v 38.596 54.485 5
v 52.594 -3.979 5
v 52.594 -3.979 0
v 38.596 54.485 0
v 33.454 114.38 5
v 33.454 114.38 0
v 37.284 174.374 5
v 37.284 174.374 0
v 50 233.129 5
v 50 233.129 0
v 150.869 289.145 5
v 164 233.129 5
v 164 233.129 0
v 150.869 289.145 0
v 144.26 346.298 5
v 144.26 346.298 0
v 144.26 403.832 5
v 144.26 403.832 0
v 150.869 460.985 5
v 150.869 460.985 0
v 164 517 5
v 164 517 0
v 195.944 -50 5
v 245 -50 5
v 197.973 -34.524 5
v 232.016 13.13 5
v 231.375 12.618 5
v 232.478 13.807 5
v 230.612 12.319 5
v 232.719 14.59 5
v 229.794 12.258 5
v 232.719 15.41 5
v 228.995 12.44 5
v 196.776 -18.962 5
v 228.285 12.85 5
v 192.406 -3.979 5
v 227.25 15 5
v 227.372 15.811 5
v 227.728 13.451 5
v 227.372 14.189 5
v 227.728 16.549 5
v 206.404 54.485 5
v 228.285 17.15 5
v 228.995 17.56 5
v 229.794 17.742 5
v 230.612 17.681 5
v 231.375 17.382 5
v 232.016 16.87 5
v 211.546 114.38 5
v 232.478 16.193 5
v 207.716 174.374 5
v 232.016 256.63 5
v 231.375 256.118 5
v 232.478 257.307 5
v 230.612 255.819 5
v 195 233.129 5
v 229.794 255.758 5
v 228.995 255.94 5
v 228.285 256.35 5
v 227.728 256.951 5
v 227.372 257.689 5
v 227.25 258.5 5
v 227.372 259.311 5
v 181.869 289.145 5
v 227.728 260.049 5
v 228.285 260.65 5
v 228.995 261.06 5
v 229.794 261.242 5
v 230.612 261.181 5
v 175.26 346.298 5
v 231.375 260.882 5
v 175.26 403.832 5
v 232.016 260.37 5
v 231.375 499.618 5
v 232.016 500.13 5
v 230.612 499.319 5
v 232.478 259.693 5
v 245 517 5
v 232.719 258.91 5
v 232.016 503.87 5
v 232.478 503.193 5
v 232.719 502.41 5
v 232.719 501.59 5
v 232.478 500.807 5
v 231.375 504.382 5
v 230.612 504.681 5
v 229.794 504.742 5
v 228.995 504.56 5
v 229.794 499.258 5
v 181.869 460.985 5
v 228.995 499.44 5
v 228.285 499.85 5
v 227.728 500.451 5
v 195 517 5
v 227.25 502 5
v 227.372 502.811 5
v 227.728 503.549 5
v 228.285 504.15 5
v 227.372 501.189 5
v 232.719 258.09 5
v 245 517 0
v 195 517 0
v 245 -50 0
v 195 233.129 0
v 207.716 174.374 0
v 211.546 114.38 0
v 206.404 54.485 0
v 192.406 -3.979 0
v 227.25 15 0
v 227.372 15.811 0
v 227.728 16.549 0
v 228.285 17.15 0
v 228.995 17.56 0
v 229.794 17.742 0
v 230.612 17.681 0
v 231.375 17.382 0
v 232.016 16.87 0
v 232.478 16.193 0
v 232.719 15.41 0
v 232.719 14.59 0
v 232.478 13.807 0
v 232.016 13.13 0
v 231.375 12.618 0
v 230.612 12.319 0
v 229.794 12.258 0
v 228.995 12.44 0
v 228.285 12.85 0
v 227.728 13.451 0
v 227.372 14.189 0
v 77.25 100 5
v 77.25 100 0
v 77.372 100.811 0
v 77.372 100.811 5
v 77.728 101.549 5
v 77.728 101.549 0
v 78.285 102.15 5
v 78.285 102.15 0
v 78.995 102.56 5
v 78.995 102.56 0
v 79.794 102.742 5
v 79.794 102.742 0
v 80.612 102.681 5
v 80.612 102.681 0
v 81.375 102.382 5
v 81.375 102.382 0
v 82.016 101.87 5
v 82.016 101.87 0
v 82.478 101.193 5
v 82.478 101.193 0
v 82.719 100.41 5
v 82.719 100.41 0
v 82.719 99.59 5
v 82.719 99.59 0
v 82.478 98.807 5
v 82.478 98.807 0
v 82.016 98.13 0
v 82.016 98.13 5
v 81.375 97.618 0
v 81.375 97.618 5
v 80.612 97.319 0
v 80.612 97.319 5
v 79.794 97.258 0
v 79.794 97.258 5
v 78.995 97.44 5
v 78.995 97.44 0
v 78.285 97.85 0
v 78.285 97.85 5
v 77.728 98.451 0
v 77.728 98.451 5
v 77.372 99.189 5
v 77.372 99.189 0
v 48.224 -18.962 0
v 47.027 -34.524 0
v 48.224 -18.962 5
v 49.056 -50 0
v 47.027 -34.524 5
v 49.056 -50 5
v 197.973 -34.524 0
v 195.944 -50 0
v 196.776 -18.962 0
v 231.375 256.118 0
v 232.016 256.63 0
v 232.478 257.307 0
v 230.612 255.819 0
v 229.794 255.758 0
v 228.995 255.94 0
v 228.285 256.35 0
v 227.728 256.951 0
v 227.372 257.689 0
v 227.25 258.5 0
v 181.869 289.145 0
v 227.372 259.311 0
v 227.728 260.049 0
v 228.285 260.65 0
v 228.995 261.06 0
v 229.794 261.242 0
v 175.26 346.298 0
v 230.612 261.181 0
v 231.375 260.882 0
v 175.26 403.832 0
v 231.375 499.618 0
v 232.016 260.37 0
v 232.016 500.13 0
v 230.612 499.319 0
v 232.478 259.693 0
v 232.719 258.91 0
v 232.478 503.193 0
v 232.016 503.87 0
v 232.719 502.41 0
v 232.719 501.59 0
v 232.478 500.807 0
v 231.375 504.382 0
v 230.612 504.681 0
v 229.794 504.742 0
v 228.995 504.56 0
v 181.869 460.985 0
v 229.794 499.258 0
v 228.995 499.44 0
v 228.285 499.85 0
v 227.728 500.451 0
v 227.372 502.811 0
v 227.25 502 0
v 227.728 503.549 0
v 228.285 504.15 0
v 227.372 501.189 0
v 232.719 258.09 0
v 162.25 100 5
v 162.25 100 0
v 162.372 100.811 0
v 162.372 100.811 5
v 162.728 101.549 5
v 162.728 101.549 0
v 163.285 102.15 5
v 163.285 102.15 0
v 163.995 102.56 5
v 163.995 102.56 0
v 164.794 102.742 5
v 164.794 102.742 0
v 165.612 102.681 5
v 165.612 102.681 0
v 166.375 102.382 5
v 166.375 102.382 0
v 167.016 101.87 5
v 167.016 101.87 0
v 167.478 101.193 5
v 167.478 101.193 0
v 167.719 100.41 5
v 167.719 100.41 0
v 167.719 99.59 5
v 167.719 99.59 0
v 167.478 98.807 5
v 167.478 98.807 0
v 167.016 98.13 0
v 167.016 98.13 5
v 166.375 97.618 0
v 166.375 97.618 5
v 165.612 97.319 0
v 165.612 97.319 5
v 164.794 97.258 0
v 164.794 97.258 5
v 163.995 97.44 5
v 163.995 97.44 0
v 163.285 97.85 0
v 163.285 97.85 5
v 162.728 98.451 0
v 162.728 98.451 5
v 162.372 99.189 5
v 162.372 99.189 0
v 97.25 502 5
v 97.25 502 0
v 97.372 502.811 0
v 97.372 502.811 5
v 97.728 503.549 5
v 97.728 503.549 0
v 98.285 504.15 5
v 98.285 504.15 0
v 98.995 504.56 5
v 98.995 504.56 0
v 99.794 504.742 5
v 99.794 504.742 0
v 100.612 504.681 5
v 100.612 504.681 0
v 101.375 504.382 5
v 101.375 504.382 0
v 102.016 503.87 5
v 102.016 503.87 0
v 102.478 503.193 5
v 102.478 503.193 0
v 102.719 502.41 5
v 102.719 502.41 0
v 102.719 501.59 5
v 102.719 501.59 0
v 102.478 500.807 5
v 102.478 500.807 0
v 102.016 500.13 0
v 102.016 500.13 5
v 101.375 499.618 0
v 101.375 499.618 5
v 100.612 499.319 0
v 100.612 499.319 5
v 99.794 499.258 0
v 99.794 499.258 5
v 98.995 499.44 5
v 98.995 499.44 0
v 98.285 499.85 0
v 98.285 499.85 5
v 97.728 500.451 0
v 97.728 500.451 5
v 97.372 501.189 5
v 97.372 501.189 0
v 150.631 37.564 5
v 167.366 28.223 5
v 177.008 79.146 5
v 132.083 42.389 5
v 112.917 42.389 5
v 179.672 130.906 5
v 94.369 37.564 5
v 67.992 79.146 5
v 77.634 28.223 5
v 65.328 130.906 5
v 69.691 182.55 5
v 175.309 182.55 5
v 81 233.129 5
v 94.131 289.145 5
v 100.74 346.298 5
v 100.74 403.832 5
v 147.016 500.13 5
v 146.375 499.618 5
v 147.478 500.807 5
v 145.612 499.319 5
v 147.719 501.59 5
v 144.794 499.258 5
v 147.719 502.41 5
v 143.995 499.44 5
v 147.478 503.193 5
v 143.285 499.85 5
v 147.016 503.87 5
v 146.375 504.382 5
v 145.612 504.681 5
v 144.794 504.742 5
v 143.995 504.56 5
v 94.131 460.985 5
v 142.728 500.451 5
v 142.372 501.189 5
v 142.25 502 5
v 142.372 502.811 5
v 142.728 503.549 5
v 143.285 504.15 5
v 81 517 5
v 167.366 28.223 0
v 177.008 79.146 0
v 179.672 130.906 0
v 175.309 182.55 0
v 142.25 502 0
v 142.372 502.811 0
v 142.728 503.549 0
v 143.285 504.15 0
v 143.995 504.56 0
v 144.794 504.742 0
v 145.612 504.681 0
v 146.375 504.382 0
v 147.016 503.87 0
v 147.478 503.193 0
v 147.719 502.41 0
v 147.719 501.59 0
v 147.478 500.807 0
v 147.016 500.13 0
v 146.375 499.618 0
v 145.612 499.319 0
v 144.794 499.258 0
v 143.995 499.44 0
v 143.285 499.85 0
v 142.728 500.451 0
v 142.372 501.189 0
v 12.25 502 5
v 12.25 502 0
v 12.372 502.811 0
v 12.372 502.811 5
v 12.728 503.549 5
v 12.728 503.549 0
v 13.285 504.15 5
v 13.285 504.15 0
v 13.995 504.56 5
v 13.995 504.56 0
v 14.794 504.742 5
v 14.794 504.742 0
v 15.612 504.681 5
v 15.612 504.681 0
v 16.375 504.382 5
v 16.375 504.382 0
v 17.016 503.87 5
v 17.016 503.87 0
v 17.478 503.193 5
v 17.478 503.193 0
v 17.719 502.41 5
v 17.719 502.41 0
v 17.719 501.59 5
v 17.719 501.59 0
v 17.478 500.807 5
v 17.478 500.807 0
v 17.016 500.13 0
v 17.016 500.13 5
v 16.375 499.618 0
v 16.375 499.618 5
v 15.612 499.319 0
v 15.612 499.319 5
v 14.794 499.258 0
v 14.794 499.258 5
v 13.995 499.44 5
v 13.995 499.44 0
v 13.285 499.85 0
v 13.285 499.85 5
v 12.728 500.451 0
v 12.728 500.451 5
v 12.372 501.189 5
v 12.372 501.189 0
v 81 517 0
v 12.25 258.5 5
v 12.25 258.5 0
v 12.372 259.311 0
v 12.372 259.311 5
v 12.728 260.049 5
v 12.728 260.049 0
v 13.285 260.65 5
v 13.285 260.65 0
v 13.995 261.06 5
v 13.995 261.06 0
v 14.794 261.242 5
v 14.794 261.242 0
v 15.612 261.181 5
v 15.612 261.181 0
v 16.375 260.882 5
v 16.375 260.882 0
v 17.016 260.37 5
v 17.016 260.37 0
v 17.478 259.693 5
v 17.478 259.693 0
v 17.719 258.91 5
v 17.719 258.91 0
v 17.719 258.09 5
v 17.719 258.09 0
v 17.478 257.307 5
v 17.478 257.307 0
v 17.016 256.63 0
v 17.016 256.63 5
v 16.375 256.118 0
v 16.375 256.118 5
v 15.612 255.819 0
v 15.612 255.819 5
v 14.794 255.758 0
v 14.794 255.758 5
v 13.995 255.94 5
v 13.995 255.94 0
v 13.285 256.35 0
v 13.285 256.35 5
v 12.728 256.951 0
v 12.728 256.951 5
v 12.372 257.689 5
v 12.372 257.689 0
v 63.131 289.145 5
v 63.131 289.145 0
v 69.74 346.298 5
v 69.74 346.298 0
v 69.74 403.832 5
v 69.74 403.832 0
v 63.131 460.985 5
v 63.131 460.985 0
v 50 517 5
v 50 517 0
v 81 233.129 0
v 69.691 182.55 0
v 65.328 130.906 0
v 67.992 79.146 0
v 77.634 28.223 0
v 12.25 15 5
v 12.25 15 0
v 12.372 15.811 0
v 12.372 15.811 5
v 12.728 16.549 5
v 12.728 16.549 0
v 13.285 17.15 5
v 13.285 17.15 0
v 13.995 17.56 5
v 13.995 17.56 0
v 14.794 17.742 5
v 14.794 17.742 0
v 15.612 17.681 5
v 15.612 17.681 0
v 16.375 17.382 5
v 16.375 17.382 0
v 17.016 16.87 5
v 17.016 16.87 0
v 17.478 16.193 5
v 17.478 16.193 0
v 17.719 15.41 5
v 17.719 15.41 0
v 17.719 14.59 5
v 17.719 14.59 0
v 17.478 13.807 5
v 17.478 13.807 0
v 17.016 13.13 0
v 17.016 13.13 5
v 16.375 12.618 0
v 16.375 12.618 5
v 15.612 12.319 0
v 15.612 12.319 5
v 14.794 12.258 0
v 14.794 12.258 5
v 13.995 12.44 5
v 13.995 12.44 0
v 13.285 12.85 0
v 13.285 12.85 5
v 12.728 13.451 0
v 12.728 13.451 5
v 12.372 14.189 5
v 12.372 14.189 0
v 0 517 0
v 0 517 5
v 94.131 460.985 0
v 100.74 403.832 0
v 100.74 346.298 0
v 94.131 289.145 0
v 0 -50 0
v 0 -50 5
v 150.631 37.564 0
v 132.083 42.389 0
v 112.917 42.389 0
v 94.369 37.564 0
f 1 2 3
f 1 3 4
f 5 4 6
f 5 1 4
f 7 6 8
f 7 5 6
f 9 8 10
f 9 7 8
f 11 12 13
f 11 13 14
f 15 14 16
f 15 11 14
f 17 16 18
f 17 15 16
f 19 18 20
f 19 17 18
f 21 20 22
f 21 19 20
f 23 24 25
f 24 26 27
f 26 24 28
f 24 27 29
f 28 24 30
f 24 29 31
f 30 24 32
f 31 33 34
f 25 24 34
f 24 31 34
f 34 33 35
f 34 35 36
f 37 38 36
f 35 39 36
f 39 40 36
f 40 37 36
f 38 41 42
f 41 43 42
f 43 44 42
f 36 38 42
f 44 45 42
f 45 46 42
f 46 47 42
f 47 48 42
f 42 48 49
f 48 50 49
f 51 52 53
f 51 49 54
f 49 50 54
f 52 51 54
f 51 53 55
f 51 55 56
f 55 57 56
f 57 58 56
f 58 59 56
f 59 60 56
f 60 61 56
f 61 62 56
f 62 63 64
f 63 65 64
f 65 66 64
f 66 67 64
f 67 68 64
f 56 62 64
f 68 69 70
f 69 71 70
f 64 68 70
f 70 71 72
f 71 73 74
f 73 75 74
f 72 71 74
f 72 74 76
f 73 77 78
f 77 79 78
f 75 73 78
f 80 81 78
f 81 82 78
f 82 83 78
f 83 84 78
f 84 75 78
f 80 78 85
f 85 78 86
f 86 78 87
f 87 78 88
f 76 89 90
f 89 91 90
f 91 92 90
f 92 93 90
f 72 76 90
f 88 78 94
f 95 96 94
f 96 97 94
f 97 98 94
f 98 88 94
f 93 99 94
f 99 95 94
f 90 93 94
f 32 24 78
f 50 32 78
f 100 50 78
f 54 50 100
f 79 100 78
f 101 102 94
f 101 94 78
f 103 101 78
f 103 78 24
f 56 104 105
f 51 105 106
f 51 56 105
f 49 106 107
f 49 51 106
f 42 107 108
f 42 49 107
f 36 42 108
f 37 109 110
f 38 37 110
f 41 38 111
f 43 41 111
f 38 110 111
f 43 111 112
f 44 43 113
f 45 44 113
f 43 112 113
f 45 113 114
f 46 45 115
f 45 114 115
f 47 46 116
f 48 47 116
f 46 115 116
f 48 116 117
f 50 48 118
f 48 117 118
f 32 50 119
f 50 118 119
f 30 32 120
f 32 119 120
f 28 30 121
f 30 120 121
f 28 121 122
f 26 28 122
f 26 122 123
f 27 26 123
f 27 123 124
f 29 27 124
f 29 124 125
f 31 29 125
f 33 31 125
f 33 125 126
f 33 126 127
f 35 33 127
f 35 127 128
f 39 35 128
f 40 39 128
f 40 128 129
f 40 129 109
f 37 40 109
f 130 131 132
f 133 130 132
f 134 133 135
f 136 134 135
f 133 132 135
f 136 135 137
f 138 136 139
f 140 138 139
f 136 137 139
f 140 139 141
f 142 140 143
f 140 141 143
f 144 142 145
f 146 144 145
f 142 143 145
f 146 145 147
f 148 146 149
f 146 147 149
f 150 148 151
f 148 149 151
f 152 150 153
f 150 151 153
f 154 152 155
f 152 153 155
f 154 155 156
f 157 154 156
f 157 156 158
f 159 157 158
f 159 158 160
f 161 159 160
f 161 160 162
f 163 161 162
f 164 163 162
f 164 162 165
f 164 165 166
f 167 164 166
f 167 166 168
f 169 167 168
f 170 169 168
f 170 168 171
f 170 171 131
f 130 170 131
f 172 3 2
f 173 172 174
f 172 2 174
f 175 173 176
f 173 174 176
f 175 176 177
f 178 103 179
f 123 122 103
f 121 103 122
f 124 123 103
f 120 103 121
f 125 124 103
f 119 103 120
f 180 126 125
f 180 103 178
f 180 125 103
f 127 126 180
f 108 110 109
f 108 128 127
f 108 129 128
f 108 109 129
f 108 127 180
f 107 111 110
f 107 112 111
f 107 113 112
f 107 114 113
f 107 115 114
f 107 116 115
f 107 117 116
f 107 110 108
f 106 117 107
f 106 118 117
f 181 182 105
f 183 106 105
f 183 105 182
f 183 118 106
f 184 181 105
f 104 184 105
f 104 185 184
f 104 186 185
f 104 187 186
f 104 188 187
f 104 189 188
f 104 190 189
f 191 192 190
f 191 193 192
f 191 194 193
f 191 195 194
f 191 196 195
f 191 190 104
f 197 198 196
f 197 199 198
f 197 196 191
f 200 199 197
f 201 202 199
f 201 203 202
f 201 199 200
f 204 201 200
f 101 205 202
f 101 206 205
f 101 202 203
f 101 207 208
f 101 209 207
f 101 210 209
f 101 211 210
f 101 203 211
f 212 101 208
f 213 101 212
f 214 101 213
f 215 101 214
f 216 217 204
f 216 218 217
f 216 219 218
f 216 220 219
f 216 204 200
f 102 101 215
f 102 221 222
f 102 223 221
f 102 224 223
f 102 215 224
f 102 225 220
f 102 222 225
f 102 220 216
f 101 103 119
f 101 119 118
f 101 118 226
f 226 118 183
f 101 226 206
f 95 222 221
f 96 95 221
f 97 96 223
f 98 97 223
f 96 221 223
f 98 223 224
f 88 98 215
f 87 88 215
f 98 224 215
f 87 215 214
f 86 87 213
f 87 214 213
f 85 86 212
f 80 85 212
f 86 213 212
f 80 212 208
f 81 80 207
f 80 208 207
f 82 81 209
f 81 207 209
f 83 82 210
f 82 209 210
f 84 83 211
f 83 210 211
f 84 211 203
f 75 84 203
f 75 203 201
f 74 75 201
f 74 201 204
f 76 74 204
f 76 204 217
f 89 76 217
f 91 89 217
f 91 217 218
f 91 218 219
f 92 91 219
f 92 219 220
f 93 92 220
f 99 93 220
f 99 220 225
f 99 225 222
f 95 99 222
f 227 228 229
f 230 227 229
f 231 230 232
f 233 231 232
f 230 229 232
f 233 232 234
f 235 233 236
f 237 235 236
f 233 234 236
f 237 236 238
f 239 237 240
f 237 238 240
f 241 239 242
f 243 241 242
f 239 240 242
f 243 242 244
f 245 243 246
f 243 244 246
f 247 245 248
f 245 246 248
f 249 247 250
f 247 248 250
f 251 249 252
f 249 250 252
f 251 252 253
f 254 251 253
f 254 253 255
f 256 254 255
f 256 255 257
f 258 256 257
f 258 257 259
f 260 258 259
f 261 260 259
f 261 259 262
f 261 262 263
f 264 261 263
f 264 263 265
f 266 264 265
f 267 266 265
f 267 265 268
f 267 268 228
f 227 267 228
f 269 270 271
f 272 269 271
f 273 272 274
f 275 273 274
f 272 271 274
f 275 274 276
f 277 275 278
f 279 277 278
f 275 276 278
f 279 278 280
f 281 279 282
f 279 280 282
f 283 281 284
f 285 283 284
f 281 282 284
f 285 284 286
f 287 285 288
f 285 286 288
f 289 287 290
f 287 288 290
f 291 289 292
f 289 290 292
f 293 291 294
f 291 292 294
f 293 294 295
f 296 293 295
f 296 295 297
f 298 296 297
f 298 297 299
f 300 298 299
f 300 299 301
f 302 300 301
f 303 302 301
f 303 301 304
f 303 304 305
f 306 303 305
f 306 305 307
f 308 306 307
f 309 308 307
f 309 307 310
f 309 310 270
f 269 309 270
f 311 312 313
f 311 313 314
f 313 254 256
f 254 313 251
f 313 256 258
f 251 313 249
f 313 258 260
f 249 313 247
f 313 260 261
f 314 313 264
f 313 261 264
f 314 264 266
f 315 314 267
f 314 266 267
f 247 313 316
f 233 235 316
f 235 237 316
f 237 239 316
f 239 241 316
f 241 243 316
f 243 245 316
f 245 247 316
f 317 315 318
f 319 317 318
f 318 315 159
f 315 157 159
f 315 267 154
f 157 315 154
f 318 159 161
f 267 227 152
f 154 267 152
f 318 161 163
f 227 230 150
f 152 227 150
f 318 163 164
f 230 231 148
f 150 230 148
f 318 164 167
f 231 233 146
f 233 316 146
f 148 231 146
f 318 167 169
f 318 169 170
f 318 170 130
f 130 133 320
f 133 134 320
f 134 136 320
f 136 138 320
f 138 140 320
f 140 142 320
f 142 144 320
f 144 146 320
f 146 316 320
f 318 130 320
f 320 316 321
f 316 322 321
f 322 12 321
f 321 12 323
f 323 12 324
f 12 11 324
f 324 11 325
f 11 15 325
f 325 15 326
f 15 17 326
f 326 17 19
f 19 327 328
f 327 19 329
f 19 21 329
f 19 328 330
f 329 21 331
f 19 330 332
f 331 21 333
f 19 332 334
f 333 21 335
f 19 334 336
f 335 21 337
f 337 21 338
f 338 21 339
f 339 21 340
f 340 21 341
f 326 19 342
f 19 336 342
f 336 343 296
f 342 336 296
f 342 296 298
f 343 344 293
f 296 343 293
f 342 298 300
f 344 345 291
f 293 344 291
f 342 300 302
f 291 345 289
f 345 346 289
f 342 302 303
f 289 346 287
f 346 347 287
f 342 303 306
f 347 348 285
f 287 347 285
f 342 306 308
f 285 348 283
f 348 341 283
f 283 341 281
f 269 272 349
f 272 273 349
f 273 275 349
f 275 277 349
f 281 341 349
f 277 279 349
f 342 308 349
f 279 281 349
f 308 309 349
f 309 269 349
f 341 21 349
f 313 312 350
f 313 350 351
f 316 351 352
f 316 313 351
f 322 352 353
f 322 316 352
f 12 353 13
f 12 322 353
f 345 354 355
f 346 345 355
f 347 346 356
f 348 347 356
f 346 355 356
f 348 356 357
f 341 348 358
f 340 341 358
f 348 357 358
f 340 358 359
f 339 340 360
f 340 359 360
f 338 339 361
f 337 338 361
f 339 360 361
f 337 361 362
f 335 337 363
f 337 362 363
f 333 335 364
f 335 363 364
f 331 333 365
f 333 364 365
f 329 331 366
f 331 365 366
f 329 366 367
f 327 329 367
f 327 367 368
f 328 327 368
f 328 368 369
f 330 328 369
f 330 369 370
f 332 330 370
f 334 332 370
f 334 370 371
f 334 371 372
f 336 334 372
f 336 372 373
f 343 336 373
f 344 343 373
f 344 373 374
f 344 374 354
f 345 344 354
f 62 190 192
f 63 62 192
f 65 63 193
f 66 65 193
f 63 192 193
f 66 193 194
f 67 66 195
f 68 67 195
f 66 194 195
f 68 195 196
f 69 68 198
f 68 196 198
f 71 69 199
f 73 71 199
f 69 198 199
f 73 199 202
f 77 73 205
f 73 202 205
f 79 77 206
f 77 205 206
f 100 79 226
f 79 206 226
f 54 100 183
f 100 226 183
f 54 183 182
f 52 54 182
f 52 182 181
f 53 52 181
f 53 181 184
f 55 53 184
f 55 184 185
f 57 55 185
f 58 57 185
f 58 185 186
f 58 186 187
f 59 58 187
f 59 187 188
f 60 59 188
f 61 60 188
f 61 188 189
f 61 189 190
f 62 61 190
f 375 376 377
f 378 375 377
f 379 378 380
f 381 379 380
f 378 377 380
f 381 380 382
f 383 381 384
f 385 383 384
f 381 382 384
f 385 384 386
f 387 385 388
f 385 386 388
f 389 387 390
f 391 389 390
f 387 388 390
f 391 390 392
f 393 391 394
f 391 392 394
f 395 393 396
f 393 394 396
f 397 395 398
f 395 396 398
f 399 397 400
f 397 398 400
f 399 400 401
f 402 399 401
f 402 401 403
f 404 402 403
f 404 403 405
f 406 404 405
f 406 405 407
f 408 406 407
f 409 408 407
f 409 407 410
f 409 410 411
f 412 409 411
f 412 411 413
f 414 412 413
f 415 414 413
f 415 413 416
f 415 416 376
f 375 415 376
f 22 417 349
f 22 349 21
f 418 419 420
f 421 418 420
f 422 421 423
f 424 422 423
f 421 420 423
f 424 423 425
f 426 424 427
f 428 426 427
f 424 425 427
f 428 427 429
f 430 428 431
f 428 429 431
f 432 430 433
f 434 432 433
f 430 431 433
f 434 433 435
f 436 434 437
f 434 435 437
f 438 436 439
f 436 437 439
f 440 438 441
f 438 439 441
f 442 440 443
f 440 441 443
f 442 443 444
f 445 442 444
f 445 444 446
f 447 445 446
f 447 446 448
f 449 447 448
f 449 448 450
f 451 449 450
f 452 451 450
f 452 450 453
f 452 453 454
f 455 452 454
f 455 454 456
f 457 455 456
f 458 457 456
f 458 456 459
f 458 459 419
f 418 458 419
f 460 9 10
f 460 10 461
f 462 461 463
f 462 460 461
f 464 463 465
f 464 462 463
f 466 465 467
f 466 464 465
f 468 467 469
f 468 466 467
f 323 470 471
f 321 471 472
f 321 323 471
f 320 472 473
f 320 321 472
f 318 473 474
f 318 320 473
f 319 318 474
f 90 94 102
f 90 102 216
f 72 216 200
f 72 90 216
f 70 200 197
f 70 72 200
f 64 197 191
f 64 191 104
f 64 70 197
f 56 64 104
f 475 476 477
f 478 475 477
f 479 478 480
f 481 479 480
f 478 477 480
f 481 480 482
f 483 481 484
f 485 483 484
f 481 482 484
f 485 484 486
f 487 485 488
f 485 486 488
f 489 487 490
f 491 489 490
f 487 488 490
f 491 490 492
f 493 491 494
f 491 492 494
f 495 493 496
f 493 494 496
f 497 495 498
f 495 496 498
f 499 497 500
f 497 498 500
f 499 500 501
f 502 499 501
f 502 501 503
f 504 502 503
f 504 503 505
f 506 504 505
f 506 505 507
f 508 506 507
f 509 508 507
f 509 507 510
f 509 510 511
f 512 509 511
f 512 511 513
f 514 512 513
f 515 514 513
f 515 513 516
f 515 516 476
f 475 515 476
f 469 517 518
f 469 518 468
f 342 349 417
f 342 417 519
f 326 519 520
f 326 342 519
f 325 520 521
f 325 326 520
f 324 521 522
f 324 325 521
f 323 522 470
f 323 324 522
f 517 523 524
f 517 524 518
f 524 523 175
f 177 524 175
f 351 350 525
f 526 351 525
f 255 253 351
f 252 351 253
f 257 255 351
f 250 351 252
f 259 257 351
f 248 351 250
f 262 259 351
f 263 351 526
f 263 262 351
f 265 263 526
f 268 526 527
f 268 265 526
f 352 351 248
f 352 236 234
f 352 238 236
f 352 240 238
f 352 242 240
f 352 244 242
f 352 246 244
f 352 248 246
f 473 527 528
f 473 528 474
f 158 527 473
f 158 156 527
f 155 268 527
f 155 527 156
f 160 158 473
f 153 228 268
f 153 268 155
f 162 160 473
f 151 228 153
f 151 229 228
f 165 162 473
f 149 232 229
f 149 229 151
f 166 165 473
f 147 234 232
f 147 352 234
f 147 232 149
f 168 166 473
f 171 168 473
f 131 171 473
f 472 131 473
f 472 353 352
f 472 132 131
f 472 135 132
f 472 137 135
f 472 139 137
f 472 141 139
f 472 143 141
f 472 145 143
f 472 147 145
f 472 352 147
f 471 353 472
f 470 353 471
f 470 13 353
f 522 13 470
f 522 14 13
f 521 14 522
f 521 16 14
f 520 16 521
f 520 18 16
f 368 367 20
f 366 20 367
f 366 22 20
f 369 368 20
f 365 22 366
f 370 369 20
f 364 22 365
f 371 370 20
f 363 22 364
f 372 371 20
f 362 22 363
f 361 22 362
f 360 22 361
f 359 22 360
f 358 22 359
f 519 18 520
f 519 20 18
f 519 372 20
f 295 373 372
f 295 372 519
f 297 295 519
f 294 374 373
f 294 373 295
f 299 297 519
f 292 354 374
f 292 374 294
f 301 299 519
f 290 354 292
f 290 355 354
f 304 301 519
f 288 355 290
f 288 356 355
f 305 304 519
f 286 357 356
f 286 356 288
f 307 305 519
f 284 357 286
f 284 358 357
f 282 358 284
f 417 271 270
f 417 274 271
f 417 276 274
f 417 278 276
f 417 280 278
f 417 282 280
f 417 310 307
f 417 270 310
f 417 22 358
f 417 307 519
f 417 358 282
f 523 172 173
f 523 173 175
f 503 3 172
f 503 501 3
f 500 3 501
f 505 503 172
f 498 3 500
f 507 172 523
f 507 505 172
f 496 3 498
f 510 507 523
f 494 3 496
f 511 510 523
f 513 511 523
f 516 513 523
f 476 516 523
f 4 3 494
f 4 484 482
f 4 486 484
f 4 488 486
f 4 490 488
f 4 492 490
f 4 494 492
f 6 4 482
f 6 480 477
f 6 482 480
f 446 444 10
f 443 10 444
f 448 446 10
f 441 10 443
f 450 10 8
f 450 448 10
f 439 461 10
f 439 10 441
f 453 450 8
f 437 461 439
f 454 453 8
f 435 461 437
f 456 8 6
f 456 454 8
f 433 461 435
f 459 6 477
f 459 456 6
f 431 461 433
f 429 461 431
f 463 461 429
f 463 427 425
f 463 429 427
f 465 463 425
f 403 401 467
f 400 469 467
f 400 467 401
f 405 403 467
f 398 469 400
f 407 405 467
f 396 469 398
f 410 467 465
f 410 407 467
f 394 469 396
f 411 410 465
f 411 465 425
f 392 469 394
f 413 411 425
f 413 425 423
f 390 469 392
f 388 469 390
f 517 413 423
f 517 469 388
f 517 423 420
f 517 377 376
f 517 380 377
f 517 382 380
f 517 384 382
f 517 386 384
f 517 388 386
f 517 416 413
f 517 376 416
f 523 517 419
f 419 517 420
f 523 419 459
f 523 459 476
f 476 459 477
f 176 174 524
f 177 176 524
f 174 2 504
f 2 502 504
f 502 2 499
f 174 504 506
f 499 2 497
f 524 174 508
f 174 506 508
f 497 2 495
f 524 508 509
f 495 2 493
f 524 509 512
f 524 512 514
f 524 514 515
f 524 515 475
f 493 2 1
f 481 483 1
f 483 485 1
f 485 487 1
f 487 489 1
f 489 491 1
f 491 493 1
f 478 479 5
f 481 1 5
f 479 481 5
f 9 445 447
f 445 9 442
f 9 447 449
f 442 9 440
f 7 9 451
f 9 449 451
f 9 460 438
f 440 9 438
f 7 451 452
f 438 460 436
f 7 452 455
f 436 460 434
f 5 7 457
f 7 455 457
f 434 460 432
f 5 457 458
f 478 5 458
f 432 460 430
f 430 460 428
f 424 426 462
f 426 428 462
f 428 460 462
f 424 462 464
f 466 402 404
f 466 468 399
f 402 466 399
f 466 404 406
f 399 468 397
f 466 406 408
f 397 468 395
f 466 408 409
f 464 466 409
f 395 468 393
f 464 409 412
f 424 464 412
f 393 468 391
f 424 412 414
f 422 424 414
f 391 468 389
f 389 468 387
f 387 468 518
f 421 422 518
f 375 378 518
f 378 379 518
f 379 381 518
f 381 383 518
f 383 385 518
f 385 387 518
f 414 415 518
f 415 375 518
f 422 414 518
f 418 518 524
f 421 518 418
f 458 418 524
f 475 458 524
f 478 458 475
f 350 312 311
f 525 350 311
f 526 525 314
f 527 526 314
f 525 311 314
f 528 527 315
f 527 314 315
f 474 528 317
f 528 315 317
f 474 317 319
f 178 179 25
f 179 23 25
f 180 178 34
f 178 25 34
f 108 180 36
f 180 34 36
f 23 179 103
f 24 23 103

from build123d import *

# Parameters (mm, degrees)
ESQUISSE1_W                         = 245
ESQUISSE1_H                         = 517
BOSS_EXTRU_1_DEPTH                  = 5
D_GAGEMENT_M51_D                    = 5.5
BOSS_EXTRU_2_DEPTH                  = 5
ENL_V_MAT_EXTRU_4_REACH             = 7
ENL_V_MAT_EXTRU_4_DIRECTION_2_DEPTH = 1
ESQUISSE9_R                         = 75.5
ENL_V_MAT_EXTRU_5_DEPTH             = 6
ENL_V_MAT_EXTRU_7_REACH             = 7
ESQUISSE13_W                        = 5
ESQUISSE13_H                        = 17


with BuildPart() as part:
    # Esquisse1 → Boss.-Extru.1 (new body)
    with BuildSketch(Plane.XY):
        with Locations((122.5, 258.5)):
            Rectangle(ESQUISSE1_W, ESQUISSE1_H)
    extrude(amount=BOSS_EXTRU_1_DEPTH)

    # Dégagement M51 (through all)
    with Locations(Plane(origin=(15, 502, 5), x_dir=(1, 0, 0), z_dir=(0, 0, 1))):
        with Locations((0, 0), (0, -487), (0, -243.5), (85, 0), (130, 0), (65, -402), (150, -402), (215, -487), (215, -243.5), (215, 0)):
            Hole(D_GAGEMENT_M51_D / 2)

    # Esquisse5 → Boss.-Extru.2 (add)
    with BuildSketch(Plane.XY):
        Polygon((0, 0), (245, 0), (245, -50), (0, -50), (-5, -50), (-5, -33), (0, -33), align=None)
    extrude(amount=BOSS_EXTRU_2_DEPTH)

    # Esquisse7 → Enlèv. mat.-Extru.4 (cut, up to next)
    with BuildSketch(Plane.XY.offset(5), mode=Mode.PRIVATE) as enl_v_mat_extru_4_sk1:
        with BuildLine():
            Line((50, 517), (81, 517))
            ThreePointArc((81, 517), (101.568699483, 375.064704586), (81, 233.129409171))
            ThreePointArc((81, 233.129409171), (66.939640676, 89.008542991), (107.5, -50))
            Line((107.5, -50), (70.5, -50))
            ThreePointArc((70.5, -50), (34.481692227, 89.698948884), (50, 233.129409171))
            ThreePointArc((50, 233.129409171), (70.568699483, 375.064704586), (50, 517))
        make_face()
    enl_v_mat_extru_4_tool1 = extrude(enl_v_mat_extru_4_sk1.sketch, amount=-ENL_V_MAT_EXTRU_4_REACH, mode=Mode.PRIVATE) & part.part
    add(enl_v_mat_extru_4_tool1.solids().sort_by_distance((69.238426, 227.207217, 5))[0], mode=Mode.SUBTRACT)
    # Esquisse7 → Enlèv. mat.-Extru.4 (cut, up to next)
    with BuildSketch(Plane.XY.offset(5), mode=Mode.PRIVATE) as enl_v_mat_extru_4_sk2:
        with BuildLine():
            Line((164, 517), (195, 517))
            ThreePointArc((195, 517), (174.431300517, 375.064704586), (195, 233.129409171))
            ThreePointArc((195, 233.129409171), (210.518307773, 89.698948884), (174.5, -50))
            Line((174.5, -50), (137.5, -50))
            ThreePointArc((137.5, -50), (178.060359324, 89.008542991), (164, 233.129409171))
            ThreePointArc((164, 233.129409171), (143.431300517, 375.064704586), (164, 517))
        make_face()
    enl_v_mat_extru_4_tool2 = extrude(enl_v_mat_extru_4_sk2.sketch, amount=-ENL_V_MAT_EXTRU_4_REACH, mode=Mode.PRIVATE) & part.part
    add(enl_v_mat_extru_4_tool2.solids().sort_by_distance((175.761574, 227.207217, 5))[0], mode=Mode.SUBTRACT)

    # Esquisse7 → Enlèv. mat.-Extru.4 direction 2 (cut)
    with BuildSketch(Plane.XY.offset(5)):
        with BuildLine():
            Line((50, 517), (81, 517))
            ThreePointArc((81, 517), (101.568699483, 375.064704586), (81, 233.129409171))
            ThreePointArc((81, 233.129409171), (66.939640676, 89.008542991), (107.5, -50))
            Line((107.5, -50), (70.5, -50))
            ThreePointArc((70.5, -50), (34.481692227, 89.698948884), (50, 233.129409171))
            ThreePointArc((50, 233.129409171), (70.568699483, 375.064704586), (50, 517))
        make_face()
        with BuildLine():
            Line((164, 517), (195, 517))
            ThreePointArc((195, 517), (174.431300517, 375.064704586), (195, 233.129409171))
            ThreePointArc((195, 233.129409171), (210.518307773, 89.698948884), (174.5, -50))
            Line((174.5, -50), (137.5, -50))
            ThreePointArc((137.5, -50), (178.060359324, 89.008542991), (164, 233.129409171))
            ThreePointArc((164, 233.129409171), (143.431300517, 375.064704586), (164, 517))
        make_face()
    extrude(amount=ENL_V_MAT_EXTRU_4_DIRECTION_2_DEPTH, mode=Mode.SUBTRACT)

    # Esquisse9 → Enlèv. mat.-Extru.5 (cut, through all)
    with BuildSketch(Plane.XY.offset(5)):
        with Locations((122.5, -32.5)):
            Circle(ESQUISSE9_R)
    extrude(amount=-ENL_V_MAT_EXTRU_5_DEPTH, mode=Mode.SUBTRACT)

    # Esquisse13 → Enlèv. mat.-Extru.7 (cut, up to next)
    with BuildSketch(Plane(origin=(0, 0, 0), x_dir=(-1, 0, 0), z_dir=(0, 0, -1)), mode=Mode.PRIVATE) as enl_v_mat_extru_7_sk1:
        with Locations((2.5, -41.5)):
            Rectangle(ESQUISSE13_W, ESQUISSE13_H)
    enl_v_mat_extru_7_tool1 = extrude(enl_v_mat_extru_7_sk1.sketch, amount=-ENL_V_MAT_EXTRU_7_REACH, mode=Mode.PRIVATE) & part.part
    add(enl_v_mat_extru_7_tool1.solids().sort_by_distance((-2.5, -41.5, 0))[0], mode=Mode.SUBTRACT)


solid = part.part
